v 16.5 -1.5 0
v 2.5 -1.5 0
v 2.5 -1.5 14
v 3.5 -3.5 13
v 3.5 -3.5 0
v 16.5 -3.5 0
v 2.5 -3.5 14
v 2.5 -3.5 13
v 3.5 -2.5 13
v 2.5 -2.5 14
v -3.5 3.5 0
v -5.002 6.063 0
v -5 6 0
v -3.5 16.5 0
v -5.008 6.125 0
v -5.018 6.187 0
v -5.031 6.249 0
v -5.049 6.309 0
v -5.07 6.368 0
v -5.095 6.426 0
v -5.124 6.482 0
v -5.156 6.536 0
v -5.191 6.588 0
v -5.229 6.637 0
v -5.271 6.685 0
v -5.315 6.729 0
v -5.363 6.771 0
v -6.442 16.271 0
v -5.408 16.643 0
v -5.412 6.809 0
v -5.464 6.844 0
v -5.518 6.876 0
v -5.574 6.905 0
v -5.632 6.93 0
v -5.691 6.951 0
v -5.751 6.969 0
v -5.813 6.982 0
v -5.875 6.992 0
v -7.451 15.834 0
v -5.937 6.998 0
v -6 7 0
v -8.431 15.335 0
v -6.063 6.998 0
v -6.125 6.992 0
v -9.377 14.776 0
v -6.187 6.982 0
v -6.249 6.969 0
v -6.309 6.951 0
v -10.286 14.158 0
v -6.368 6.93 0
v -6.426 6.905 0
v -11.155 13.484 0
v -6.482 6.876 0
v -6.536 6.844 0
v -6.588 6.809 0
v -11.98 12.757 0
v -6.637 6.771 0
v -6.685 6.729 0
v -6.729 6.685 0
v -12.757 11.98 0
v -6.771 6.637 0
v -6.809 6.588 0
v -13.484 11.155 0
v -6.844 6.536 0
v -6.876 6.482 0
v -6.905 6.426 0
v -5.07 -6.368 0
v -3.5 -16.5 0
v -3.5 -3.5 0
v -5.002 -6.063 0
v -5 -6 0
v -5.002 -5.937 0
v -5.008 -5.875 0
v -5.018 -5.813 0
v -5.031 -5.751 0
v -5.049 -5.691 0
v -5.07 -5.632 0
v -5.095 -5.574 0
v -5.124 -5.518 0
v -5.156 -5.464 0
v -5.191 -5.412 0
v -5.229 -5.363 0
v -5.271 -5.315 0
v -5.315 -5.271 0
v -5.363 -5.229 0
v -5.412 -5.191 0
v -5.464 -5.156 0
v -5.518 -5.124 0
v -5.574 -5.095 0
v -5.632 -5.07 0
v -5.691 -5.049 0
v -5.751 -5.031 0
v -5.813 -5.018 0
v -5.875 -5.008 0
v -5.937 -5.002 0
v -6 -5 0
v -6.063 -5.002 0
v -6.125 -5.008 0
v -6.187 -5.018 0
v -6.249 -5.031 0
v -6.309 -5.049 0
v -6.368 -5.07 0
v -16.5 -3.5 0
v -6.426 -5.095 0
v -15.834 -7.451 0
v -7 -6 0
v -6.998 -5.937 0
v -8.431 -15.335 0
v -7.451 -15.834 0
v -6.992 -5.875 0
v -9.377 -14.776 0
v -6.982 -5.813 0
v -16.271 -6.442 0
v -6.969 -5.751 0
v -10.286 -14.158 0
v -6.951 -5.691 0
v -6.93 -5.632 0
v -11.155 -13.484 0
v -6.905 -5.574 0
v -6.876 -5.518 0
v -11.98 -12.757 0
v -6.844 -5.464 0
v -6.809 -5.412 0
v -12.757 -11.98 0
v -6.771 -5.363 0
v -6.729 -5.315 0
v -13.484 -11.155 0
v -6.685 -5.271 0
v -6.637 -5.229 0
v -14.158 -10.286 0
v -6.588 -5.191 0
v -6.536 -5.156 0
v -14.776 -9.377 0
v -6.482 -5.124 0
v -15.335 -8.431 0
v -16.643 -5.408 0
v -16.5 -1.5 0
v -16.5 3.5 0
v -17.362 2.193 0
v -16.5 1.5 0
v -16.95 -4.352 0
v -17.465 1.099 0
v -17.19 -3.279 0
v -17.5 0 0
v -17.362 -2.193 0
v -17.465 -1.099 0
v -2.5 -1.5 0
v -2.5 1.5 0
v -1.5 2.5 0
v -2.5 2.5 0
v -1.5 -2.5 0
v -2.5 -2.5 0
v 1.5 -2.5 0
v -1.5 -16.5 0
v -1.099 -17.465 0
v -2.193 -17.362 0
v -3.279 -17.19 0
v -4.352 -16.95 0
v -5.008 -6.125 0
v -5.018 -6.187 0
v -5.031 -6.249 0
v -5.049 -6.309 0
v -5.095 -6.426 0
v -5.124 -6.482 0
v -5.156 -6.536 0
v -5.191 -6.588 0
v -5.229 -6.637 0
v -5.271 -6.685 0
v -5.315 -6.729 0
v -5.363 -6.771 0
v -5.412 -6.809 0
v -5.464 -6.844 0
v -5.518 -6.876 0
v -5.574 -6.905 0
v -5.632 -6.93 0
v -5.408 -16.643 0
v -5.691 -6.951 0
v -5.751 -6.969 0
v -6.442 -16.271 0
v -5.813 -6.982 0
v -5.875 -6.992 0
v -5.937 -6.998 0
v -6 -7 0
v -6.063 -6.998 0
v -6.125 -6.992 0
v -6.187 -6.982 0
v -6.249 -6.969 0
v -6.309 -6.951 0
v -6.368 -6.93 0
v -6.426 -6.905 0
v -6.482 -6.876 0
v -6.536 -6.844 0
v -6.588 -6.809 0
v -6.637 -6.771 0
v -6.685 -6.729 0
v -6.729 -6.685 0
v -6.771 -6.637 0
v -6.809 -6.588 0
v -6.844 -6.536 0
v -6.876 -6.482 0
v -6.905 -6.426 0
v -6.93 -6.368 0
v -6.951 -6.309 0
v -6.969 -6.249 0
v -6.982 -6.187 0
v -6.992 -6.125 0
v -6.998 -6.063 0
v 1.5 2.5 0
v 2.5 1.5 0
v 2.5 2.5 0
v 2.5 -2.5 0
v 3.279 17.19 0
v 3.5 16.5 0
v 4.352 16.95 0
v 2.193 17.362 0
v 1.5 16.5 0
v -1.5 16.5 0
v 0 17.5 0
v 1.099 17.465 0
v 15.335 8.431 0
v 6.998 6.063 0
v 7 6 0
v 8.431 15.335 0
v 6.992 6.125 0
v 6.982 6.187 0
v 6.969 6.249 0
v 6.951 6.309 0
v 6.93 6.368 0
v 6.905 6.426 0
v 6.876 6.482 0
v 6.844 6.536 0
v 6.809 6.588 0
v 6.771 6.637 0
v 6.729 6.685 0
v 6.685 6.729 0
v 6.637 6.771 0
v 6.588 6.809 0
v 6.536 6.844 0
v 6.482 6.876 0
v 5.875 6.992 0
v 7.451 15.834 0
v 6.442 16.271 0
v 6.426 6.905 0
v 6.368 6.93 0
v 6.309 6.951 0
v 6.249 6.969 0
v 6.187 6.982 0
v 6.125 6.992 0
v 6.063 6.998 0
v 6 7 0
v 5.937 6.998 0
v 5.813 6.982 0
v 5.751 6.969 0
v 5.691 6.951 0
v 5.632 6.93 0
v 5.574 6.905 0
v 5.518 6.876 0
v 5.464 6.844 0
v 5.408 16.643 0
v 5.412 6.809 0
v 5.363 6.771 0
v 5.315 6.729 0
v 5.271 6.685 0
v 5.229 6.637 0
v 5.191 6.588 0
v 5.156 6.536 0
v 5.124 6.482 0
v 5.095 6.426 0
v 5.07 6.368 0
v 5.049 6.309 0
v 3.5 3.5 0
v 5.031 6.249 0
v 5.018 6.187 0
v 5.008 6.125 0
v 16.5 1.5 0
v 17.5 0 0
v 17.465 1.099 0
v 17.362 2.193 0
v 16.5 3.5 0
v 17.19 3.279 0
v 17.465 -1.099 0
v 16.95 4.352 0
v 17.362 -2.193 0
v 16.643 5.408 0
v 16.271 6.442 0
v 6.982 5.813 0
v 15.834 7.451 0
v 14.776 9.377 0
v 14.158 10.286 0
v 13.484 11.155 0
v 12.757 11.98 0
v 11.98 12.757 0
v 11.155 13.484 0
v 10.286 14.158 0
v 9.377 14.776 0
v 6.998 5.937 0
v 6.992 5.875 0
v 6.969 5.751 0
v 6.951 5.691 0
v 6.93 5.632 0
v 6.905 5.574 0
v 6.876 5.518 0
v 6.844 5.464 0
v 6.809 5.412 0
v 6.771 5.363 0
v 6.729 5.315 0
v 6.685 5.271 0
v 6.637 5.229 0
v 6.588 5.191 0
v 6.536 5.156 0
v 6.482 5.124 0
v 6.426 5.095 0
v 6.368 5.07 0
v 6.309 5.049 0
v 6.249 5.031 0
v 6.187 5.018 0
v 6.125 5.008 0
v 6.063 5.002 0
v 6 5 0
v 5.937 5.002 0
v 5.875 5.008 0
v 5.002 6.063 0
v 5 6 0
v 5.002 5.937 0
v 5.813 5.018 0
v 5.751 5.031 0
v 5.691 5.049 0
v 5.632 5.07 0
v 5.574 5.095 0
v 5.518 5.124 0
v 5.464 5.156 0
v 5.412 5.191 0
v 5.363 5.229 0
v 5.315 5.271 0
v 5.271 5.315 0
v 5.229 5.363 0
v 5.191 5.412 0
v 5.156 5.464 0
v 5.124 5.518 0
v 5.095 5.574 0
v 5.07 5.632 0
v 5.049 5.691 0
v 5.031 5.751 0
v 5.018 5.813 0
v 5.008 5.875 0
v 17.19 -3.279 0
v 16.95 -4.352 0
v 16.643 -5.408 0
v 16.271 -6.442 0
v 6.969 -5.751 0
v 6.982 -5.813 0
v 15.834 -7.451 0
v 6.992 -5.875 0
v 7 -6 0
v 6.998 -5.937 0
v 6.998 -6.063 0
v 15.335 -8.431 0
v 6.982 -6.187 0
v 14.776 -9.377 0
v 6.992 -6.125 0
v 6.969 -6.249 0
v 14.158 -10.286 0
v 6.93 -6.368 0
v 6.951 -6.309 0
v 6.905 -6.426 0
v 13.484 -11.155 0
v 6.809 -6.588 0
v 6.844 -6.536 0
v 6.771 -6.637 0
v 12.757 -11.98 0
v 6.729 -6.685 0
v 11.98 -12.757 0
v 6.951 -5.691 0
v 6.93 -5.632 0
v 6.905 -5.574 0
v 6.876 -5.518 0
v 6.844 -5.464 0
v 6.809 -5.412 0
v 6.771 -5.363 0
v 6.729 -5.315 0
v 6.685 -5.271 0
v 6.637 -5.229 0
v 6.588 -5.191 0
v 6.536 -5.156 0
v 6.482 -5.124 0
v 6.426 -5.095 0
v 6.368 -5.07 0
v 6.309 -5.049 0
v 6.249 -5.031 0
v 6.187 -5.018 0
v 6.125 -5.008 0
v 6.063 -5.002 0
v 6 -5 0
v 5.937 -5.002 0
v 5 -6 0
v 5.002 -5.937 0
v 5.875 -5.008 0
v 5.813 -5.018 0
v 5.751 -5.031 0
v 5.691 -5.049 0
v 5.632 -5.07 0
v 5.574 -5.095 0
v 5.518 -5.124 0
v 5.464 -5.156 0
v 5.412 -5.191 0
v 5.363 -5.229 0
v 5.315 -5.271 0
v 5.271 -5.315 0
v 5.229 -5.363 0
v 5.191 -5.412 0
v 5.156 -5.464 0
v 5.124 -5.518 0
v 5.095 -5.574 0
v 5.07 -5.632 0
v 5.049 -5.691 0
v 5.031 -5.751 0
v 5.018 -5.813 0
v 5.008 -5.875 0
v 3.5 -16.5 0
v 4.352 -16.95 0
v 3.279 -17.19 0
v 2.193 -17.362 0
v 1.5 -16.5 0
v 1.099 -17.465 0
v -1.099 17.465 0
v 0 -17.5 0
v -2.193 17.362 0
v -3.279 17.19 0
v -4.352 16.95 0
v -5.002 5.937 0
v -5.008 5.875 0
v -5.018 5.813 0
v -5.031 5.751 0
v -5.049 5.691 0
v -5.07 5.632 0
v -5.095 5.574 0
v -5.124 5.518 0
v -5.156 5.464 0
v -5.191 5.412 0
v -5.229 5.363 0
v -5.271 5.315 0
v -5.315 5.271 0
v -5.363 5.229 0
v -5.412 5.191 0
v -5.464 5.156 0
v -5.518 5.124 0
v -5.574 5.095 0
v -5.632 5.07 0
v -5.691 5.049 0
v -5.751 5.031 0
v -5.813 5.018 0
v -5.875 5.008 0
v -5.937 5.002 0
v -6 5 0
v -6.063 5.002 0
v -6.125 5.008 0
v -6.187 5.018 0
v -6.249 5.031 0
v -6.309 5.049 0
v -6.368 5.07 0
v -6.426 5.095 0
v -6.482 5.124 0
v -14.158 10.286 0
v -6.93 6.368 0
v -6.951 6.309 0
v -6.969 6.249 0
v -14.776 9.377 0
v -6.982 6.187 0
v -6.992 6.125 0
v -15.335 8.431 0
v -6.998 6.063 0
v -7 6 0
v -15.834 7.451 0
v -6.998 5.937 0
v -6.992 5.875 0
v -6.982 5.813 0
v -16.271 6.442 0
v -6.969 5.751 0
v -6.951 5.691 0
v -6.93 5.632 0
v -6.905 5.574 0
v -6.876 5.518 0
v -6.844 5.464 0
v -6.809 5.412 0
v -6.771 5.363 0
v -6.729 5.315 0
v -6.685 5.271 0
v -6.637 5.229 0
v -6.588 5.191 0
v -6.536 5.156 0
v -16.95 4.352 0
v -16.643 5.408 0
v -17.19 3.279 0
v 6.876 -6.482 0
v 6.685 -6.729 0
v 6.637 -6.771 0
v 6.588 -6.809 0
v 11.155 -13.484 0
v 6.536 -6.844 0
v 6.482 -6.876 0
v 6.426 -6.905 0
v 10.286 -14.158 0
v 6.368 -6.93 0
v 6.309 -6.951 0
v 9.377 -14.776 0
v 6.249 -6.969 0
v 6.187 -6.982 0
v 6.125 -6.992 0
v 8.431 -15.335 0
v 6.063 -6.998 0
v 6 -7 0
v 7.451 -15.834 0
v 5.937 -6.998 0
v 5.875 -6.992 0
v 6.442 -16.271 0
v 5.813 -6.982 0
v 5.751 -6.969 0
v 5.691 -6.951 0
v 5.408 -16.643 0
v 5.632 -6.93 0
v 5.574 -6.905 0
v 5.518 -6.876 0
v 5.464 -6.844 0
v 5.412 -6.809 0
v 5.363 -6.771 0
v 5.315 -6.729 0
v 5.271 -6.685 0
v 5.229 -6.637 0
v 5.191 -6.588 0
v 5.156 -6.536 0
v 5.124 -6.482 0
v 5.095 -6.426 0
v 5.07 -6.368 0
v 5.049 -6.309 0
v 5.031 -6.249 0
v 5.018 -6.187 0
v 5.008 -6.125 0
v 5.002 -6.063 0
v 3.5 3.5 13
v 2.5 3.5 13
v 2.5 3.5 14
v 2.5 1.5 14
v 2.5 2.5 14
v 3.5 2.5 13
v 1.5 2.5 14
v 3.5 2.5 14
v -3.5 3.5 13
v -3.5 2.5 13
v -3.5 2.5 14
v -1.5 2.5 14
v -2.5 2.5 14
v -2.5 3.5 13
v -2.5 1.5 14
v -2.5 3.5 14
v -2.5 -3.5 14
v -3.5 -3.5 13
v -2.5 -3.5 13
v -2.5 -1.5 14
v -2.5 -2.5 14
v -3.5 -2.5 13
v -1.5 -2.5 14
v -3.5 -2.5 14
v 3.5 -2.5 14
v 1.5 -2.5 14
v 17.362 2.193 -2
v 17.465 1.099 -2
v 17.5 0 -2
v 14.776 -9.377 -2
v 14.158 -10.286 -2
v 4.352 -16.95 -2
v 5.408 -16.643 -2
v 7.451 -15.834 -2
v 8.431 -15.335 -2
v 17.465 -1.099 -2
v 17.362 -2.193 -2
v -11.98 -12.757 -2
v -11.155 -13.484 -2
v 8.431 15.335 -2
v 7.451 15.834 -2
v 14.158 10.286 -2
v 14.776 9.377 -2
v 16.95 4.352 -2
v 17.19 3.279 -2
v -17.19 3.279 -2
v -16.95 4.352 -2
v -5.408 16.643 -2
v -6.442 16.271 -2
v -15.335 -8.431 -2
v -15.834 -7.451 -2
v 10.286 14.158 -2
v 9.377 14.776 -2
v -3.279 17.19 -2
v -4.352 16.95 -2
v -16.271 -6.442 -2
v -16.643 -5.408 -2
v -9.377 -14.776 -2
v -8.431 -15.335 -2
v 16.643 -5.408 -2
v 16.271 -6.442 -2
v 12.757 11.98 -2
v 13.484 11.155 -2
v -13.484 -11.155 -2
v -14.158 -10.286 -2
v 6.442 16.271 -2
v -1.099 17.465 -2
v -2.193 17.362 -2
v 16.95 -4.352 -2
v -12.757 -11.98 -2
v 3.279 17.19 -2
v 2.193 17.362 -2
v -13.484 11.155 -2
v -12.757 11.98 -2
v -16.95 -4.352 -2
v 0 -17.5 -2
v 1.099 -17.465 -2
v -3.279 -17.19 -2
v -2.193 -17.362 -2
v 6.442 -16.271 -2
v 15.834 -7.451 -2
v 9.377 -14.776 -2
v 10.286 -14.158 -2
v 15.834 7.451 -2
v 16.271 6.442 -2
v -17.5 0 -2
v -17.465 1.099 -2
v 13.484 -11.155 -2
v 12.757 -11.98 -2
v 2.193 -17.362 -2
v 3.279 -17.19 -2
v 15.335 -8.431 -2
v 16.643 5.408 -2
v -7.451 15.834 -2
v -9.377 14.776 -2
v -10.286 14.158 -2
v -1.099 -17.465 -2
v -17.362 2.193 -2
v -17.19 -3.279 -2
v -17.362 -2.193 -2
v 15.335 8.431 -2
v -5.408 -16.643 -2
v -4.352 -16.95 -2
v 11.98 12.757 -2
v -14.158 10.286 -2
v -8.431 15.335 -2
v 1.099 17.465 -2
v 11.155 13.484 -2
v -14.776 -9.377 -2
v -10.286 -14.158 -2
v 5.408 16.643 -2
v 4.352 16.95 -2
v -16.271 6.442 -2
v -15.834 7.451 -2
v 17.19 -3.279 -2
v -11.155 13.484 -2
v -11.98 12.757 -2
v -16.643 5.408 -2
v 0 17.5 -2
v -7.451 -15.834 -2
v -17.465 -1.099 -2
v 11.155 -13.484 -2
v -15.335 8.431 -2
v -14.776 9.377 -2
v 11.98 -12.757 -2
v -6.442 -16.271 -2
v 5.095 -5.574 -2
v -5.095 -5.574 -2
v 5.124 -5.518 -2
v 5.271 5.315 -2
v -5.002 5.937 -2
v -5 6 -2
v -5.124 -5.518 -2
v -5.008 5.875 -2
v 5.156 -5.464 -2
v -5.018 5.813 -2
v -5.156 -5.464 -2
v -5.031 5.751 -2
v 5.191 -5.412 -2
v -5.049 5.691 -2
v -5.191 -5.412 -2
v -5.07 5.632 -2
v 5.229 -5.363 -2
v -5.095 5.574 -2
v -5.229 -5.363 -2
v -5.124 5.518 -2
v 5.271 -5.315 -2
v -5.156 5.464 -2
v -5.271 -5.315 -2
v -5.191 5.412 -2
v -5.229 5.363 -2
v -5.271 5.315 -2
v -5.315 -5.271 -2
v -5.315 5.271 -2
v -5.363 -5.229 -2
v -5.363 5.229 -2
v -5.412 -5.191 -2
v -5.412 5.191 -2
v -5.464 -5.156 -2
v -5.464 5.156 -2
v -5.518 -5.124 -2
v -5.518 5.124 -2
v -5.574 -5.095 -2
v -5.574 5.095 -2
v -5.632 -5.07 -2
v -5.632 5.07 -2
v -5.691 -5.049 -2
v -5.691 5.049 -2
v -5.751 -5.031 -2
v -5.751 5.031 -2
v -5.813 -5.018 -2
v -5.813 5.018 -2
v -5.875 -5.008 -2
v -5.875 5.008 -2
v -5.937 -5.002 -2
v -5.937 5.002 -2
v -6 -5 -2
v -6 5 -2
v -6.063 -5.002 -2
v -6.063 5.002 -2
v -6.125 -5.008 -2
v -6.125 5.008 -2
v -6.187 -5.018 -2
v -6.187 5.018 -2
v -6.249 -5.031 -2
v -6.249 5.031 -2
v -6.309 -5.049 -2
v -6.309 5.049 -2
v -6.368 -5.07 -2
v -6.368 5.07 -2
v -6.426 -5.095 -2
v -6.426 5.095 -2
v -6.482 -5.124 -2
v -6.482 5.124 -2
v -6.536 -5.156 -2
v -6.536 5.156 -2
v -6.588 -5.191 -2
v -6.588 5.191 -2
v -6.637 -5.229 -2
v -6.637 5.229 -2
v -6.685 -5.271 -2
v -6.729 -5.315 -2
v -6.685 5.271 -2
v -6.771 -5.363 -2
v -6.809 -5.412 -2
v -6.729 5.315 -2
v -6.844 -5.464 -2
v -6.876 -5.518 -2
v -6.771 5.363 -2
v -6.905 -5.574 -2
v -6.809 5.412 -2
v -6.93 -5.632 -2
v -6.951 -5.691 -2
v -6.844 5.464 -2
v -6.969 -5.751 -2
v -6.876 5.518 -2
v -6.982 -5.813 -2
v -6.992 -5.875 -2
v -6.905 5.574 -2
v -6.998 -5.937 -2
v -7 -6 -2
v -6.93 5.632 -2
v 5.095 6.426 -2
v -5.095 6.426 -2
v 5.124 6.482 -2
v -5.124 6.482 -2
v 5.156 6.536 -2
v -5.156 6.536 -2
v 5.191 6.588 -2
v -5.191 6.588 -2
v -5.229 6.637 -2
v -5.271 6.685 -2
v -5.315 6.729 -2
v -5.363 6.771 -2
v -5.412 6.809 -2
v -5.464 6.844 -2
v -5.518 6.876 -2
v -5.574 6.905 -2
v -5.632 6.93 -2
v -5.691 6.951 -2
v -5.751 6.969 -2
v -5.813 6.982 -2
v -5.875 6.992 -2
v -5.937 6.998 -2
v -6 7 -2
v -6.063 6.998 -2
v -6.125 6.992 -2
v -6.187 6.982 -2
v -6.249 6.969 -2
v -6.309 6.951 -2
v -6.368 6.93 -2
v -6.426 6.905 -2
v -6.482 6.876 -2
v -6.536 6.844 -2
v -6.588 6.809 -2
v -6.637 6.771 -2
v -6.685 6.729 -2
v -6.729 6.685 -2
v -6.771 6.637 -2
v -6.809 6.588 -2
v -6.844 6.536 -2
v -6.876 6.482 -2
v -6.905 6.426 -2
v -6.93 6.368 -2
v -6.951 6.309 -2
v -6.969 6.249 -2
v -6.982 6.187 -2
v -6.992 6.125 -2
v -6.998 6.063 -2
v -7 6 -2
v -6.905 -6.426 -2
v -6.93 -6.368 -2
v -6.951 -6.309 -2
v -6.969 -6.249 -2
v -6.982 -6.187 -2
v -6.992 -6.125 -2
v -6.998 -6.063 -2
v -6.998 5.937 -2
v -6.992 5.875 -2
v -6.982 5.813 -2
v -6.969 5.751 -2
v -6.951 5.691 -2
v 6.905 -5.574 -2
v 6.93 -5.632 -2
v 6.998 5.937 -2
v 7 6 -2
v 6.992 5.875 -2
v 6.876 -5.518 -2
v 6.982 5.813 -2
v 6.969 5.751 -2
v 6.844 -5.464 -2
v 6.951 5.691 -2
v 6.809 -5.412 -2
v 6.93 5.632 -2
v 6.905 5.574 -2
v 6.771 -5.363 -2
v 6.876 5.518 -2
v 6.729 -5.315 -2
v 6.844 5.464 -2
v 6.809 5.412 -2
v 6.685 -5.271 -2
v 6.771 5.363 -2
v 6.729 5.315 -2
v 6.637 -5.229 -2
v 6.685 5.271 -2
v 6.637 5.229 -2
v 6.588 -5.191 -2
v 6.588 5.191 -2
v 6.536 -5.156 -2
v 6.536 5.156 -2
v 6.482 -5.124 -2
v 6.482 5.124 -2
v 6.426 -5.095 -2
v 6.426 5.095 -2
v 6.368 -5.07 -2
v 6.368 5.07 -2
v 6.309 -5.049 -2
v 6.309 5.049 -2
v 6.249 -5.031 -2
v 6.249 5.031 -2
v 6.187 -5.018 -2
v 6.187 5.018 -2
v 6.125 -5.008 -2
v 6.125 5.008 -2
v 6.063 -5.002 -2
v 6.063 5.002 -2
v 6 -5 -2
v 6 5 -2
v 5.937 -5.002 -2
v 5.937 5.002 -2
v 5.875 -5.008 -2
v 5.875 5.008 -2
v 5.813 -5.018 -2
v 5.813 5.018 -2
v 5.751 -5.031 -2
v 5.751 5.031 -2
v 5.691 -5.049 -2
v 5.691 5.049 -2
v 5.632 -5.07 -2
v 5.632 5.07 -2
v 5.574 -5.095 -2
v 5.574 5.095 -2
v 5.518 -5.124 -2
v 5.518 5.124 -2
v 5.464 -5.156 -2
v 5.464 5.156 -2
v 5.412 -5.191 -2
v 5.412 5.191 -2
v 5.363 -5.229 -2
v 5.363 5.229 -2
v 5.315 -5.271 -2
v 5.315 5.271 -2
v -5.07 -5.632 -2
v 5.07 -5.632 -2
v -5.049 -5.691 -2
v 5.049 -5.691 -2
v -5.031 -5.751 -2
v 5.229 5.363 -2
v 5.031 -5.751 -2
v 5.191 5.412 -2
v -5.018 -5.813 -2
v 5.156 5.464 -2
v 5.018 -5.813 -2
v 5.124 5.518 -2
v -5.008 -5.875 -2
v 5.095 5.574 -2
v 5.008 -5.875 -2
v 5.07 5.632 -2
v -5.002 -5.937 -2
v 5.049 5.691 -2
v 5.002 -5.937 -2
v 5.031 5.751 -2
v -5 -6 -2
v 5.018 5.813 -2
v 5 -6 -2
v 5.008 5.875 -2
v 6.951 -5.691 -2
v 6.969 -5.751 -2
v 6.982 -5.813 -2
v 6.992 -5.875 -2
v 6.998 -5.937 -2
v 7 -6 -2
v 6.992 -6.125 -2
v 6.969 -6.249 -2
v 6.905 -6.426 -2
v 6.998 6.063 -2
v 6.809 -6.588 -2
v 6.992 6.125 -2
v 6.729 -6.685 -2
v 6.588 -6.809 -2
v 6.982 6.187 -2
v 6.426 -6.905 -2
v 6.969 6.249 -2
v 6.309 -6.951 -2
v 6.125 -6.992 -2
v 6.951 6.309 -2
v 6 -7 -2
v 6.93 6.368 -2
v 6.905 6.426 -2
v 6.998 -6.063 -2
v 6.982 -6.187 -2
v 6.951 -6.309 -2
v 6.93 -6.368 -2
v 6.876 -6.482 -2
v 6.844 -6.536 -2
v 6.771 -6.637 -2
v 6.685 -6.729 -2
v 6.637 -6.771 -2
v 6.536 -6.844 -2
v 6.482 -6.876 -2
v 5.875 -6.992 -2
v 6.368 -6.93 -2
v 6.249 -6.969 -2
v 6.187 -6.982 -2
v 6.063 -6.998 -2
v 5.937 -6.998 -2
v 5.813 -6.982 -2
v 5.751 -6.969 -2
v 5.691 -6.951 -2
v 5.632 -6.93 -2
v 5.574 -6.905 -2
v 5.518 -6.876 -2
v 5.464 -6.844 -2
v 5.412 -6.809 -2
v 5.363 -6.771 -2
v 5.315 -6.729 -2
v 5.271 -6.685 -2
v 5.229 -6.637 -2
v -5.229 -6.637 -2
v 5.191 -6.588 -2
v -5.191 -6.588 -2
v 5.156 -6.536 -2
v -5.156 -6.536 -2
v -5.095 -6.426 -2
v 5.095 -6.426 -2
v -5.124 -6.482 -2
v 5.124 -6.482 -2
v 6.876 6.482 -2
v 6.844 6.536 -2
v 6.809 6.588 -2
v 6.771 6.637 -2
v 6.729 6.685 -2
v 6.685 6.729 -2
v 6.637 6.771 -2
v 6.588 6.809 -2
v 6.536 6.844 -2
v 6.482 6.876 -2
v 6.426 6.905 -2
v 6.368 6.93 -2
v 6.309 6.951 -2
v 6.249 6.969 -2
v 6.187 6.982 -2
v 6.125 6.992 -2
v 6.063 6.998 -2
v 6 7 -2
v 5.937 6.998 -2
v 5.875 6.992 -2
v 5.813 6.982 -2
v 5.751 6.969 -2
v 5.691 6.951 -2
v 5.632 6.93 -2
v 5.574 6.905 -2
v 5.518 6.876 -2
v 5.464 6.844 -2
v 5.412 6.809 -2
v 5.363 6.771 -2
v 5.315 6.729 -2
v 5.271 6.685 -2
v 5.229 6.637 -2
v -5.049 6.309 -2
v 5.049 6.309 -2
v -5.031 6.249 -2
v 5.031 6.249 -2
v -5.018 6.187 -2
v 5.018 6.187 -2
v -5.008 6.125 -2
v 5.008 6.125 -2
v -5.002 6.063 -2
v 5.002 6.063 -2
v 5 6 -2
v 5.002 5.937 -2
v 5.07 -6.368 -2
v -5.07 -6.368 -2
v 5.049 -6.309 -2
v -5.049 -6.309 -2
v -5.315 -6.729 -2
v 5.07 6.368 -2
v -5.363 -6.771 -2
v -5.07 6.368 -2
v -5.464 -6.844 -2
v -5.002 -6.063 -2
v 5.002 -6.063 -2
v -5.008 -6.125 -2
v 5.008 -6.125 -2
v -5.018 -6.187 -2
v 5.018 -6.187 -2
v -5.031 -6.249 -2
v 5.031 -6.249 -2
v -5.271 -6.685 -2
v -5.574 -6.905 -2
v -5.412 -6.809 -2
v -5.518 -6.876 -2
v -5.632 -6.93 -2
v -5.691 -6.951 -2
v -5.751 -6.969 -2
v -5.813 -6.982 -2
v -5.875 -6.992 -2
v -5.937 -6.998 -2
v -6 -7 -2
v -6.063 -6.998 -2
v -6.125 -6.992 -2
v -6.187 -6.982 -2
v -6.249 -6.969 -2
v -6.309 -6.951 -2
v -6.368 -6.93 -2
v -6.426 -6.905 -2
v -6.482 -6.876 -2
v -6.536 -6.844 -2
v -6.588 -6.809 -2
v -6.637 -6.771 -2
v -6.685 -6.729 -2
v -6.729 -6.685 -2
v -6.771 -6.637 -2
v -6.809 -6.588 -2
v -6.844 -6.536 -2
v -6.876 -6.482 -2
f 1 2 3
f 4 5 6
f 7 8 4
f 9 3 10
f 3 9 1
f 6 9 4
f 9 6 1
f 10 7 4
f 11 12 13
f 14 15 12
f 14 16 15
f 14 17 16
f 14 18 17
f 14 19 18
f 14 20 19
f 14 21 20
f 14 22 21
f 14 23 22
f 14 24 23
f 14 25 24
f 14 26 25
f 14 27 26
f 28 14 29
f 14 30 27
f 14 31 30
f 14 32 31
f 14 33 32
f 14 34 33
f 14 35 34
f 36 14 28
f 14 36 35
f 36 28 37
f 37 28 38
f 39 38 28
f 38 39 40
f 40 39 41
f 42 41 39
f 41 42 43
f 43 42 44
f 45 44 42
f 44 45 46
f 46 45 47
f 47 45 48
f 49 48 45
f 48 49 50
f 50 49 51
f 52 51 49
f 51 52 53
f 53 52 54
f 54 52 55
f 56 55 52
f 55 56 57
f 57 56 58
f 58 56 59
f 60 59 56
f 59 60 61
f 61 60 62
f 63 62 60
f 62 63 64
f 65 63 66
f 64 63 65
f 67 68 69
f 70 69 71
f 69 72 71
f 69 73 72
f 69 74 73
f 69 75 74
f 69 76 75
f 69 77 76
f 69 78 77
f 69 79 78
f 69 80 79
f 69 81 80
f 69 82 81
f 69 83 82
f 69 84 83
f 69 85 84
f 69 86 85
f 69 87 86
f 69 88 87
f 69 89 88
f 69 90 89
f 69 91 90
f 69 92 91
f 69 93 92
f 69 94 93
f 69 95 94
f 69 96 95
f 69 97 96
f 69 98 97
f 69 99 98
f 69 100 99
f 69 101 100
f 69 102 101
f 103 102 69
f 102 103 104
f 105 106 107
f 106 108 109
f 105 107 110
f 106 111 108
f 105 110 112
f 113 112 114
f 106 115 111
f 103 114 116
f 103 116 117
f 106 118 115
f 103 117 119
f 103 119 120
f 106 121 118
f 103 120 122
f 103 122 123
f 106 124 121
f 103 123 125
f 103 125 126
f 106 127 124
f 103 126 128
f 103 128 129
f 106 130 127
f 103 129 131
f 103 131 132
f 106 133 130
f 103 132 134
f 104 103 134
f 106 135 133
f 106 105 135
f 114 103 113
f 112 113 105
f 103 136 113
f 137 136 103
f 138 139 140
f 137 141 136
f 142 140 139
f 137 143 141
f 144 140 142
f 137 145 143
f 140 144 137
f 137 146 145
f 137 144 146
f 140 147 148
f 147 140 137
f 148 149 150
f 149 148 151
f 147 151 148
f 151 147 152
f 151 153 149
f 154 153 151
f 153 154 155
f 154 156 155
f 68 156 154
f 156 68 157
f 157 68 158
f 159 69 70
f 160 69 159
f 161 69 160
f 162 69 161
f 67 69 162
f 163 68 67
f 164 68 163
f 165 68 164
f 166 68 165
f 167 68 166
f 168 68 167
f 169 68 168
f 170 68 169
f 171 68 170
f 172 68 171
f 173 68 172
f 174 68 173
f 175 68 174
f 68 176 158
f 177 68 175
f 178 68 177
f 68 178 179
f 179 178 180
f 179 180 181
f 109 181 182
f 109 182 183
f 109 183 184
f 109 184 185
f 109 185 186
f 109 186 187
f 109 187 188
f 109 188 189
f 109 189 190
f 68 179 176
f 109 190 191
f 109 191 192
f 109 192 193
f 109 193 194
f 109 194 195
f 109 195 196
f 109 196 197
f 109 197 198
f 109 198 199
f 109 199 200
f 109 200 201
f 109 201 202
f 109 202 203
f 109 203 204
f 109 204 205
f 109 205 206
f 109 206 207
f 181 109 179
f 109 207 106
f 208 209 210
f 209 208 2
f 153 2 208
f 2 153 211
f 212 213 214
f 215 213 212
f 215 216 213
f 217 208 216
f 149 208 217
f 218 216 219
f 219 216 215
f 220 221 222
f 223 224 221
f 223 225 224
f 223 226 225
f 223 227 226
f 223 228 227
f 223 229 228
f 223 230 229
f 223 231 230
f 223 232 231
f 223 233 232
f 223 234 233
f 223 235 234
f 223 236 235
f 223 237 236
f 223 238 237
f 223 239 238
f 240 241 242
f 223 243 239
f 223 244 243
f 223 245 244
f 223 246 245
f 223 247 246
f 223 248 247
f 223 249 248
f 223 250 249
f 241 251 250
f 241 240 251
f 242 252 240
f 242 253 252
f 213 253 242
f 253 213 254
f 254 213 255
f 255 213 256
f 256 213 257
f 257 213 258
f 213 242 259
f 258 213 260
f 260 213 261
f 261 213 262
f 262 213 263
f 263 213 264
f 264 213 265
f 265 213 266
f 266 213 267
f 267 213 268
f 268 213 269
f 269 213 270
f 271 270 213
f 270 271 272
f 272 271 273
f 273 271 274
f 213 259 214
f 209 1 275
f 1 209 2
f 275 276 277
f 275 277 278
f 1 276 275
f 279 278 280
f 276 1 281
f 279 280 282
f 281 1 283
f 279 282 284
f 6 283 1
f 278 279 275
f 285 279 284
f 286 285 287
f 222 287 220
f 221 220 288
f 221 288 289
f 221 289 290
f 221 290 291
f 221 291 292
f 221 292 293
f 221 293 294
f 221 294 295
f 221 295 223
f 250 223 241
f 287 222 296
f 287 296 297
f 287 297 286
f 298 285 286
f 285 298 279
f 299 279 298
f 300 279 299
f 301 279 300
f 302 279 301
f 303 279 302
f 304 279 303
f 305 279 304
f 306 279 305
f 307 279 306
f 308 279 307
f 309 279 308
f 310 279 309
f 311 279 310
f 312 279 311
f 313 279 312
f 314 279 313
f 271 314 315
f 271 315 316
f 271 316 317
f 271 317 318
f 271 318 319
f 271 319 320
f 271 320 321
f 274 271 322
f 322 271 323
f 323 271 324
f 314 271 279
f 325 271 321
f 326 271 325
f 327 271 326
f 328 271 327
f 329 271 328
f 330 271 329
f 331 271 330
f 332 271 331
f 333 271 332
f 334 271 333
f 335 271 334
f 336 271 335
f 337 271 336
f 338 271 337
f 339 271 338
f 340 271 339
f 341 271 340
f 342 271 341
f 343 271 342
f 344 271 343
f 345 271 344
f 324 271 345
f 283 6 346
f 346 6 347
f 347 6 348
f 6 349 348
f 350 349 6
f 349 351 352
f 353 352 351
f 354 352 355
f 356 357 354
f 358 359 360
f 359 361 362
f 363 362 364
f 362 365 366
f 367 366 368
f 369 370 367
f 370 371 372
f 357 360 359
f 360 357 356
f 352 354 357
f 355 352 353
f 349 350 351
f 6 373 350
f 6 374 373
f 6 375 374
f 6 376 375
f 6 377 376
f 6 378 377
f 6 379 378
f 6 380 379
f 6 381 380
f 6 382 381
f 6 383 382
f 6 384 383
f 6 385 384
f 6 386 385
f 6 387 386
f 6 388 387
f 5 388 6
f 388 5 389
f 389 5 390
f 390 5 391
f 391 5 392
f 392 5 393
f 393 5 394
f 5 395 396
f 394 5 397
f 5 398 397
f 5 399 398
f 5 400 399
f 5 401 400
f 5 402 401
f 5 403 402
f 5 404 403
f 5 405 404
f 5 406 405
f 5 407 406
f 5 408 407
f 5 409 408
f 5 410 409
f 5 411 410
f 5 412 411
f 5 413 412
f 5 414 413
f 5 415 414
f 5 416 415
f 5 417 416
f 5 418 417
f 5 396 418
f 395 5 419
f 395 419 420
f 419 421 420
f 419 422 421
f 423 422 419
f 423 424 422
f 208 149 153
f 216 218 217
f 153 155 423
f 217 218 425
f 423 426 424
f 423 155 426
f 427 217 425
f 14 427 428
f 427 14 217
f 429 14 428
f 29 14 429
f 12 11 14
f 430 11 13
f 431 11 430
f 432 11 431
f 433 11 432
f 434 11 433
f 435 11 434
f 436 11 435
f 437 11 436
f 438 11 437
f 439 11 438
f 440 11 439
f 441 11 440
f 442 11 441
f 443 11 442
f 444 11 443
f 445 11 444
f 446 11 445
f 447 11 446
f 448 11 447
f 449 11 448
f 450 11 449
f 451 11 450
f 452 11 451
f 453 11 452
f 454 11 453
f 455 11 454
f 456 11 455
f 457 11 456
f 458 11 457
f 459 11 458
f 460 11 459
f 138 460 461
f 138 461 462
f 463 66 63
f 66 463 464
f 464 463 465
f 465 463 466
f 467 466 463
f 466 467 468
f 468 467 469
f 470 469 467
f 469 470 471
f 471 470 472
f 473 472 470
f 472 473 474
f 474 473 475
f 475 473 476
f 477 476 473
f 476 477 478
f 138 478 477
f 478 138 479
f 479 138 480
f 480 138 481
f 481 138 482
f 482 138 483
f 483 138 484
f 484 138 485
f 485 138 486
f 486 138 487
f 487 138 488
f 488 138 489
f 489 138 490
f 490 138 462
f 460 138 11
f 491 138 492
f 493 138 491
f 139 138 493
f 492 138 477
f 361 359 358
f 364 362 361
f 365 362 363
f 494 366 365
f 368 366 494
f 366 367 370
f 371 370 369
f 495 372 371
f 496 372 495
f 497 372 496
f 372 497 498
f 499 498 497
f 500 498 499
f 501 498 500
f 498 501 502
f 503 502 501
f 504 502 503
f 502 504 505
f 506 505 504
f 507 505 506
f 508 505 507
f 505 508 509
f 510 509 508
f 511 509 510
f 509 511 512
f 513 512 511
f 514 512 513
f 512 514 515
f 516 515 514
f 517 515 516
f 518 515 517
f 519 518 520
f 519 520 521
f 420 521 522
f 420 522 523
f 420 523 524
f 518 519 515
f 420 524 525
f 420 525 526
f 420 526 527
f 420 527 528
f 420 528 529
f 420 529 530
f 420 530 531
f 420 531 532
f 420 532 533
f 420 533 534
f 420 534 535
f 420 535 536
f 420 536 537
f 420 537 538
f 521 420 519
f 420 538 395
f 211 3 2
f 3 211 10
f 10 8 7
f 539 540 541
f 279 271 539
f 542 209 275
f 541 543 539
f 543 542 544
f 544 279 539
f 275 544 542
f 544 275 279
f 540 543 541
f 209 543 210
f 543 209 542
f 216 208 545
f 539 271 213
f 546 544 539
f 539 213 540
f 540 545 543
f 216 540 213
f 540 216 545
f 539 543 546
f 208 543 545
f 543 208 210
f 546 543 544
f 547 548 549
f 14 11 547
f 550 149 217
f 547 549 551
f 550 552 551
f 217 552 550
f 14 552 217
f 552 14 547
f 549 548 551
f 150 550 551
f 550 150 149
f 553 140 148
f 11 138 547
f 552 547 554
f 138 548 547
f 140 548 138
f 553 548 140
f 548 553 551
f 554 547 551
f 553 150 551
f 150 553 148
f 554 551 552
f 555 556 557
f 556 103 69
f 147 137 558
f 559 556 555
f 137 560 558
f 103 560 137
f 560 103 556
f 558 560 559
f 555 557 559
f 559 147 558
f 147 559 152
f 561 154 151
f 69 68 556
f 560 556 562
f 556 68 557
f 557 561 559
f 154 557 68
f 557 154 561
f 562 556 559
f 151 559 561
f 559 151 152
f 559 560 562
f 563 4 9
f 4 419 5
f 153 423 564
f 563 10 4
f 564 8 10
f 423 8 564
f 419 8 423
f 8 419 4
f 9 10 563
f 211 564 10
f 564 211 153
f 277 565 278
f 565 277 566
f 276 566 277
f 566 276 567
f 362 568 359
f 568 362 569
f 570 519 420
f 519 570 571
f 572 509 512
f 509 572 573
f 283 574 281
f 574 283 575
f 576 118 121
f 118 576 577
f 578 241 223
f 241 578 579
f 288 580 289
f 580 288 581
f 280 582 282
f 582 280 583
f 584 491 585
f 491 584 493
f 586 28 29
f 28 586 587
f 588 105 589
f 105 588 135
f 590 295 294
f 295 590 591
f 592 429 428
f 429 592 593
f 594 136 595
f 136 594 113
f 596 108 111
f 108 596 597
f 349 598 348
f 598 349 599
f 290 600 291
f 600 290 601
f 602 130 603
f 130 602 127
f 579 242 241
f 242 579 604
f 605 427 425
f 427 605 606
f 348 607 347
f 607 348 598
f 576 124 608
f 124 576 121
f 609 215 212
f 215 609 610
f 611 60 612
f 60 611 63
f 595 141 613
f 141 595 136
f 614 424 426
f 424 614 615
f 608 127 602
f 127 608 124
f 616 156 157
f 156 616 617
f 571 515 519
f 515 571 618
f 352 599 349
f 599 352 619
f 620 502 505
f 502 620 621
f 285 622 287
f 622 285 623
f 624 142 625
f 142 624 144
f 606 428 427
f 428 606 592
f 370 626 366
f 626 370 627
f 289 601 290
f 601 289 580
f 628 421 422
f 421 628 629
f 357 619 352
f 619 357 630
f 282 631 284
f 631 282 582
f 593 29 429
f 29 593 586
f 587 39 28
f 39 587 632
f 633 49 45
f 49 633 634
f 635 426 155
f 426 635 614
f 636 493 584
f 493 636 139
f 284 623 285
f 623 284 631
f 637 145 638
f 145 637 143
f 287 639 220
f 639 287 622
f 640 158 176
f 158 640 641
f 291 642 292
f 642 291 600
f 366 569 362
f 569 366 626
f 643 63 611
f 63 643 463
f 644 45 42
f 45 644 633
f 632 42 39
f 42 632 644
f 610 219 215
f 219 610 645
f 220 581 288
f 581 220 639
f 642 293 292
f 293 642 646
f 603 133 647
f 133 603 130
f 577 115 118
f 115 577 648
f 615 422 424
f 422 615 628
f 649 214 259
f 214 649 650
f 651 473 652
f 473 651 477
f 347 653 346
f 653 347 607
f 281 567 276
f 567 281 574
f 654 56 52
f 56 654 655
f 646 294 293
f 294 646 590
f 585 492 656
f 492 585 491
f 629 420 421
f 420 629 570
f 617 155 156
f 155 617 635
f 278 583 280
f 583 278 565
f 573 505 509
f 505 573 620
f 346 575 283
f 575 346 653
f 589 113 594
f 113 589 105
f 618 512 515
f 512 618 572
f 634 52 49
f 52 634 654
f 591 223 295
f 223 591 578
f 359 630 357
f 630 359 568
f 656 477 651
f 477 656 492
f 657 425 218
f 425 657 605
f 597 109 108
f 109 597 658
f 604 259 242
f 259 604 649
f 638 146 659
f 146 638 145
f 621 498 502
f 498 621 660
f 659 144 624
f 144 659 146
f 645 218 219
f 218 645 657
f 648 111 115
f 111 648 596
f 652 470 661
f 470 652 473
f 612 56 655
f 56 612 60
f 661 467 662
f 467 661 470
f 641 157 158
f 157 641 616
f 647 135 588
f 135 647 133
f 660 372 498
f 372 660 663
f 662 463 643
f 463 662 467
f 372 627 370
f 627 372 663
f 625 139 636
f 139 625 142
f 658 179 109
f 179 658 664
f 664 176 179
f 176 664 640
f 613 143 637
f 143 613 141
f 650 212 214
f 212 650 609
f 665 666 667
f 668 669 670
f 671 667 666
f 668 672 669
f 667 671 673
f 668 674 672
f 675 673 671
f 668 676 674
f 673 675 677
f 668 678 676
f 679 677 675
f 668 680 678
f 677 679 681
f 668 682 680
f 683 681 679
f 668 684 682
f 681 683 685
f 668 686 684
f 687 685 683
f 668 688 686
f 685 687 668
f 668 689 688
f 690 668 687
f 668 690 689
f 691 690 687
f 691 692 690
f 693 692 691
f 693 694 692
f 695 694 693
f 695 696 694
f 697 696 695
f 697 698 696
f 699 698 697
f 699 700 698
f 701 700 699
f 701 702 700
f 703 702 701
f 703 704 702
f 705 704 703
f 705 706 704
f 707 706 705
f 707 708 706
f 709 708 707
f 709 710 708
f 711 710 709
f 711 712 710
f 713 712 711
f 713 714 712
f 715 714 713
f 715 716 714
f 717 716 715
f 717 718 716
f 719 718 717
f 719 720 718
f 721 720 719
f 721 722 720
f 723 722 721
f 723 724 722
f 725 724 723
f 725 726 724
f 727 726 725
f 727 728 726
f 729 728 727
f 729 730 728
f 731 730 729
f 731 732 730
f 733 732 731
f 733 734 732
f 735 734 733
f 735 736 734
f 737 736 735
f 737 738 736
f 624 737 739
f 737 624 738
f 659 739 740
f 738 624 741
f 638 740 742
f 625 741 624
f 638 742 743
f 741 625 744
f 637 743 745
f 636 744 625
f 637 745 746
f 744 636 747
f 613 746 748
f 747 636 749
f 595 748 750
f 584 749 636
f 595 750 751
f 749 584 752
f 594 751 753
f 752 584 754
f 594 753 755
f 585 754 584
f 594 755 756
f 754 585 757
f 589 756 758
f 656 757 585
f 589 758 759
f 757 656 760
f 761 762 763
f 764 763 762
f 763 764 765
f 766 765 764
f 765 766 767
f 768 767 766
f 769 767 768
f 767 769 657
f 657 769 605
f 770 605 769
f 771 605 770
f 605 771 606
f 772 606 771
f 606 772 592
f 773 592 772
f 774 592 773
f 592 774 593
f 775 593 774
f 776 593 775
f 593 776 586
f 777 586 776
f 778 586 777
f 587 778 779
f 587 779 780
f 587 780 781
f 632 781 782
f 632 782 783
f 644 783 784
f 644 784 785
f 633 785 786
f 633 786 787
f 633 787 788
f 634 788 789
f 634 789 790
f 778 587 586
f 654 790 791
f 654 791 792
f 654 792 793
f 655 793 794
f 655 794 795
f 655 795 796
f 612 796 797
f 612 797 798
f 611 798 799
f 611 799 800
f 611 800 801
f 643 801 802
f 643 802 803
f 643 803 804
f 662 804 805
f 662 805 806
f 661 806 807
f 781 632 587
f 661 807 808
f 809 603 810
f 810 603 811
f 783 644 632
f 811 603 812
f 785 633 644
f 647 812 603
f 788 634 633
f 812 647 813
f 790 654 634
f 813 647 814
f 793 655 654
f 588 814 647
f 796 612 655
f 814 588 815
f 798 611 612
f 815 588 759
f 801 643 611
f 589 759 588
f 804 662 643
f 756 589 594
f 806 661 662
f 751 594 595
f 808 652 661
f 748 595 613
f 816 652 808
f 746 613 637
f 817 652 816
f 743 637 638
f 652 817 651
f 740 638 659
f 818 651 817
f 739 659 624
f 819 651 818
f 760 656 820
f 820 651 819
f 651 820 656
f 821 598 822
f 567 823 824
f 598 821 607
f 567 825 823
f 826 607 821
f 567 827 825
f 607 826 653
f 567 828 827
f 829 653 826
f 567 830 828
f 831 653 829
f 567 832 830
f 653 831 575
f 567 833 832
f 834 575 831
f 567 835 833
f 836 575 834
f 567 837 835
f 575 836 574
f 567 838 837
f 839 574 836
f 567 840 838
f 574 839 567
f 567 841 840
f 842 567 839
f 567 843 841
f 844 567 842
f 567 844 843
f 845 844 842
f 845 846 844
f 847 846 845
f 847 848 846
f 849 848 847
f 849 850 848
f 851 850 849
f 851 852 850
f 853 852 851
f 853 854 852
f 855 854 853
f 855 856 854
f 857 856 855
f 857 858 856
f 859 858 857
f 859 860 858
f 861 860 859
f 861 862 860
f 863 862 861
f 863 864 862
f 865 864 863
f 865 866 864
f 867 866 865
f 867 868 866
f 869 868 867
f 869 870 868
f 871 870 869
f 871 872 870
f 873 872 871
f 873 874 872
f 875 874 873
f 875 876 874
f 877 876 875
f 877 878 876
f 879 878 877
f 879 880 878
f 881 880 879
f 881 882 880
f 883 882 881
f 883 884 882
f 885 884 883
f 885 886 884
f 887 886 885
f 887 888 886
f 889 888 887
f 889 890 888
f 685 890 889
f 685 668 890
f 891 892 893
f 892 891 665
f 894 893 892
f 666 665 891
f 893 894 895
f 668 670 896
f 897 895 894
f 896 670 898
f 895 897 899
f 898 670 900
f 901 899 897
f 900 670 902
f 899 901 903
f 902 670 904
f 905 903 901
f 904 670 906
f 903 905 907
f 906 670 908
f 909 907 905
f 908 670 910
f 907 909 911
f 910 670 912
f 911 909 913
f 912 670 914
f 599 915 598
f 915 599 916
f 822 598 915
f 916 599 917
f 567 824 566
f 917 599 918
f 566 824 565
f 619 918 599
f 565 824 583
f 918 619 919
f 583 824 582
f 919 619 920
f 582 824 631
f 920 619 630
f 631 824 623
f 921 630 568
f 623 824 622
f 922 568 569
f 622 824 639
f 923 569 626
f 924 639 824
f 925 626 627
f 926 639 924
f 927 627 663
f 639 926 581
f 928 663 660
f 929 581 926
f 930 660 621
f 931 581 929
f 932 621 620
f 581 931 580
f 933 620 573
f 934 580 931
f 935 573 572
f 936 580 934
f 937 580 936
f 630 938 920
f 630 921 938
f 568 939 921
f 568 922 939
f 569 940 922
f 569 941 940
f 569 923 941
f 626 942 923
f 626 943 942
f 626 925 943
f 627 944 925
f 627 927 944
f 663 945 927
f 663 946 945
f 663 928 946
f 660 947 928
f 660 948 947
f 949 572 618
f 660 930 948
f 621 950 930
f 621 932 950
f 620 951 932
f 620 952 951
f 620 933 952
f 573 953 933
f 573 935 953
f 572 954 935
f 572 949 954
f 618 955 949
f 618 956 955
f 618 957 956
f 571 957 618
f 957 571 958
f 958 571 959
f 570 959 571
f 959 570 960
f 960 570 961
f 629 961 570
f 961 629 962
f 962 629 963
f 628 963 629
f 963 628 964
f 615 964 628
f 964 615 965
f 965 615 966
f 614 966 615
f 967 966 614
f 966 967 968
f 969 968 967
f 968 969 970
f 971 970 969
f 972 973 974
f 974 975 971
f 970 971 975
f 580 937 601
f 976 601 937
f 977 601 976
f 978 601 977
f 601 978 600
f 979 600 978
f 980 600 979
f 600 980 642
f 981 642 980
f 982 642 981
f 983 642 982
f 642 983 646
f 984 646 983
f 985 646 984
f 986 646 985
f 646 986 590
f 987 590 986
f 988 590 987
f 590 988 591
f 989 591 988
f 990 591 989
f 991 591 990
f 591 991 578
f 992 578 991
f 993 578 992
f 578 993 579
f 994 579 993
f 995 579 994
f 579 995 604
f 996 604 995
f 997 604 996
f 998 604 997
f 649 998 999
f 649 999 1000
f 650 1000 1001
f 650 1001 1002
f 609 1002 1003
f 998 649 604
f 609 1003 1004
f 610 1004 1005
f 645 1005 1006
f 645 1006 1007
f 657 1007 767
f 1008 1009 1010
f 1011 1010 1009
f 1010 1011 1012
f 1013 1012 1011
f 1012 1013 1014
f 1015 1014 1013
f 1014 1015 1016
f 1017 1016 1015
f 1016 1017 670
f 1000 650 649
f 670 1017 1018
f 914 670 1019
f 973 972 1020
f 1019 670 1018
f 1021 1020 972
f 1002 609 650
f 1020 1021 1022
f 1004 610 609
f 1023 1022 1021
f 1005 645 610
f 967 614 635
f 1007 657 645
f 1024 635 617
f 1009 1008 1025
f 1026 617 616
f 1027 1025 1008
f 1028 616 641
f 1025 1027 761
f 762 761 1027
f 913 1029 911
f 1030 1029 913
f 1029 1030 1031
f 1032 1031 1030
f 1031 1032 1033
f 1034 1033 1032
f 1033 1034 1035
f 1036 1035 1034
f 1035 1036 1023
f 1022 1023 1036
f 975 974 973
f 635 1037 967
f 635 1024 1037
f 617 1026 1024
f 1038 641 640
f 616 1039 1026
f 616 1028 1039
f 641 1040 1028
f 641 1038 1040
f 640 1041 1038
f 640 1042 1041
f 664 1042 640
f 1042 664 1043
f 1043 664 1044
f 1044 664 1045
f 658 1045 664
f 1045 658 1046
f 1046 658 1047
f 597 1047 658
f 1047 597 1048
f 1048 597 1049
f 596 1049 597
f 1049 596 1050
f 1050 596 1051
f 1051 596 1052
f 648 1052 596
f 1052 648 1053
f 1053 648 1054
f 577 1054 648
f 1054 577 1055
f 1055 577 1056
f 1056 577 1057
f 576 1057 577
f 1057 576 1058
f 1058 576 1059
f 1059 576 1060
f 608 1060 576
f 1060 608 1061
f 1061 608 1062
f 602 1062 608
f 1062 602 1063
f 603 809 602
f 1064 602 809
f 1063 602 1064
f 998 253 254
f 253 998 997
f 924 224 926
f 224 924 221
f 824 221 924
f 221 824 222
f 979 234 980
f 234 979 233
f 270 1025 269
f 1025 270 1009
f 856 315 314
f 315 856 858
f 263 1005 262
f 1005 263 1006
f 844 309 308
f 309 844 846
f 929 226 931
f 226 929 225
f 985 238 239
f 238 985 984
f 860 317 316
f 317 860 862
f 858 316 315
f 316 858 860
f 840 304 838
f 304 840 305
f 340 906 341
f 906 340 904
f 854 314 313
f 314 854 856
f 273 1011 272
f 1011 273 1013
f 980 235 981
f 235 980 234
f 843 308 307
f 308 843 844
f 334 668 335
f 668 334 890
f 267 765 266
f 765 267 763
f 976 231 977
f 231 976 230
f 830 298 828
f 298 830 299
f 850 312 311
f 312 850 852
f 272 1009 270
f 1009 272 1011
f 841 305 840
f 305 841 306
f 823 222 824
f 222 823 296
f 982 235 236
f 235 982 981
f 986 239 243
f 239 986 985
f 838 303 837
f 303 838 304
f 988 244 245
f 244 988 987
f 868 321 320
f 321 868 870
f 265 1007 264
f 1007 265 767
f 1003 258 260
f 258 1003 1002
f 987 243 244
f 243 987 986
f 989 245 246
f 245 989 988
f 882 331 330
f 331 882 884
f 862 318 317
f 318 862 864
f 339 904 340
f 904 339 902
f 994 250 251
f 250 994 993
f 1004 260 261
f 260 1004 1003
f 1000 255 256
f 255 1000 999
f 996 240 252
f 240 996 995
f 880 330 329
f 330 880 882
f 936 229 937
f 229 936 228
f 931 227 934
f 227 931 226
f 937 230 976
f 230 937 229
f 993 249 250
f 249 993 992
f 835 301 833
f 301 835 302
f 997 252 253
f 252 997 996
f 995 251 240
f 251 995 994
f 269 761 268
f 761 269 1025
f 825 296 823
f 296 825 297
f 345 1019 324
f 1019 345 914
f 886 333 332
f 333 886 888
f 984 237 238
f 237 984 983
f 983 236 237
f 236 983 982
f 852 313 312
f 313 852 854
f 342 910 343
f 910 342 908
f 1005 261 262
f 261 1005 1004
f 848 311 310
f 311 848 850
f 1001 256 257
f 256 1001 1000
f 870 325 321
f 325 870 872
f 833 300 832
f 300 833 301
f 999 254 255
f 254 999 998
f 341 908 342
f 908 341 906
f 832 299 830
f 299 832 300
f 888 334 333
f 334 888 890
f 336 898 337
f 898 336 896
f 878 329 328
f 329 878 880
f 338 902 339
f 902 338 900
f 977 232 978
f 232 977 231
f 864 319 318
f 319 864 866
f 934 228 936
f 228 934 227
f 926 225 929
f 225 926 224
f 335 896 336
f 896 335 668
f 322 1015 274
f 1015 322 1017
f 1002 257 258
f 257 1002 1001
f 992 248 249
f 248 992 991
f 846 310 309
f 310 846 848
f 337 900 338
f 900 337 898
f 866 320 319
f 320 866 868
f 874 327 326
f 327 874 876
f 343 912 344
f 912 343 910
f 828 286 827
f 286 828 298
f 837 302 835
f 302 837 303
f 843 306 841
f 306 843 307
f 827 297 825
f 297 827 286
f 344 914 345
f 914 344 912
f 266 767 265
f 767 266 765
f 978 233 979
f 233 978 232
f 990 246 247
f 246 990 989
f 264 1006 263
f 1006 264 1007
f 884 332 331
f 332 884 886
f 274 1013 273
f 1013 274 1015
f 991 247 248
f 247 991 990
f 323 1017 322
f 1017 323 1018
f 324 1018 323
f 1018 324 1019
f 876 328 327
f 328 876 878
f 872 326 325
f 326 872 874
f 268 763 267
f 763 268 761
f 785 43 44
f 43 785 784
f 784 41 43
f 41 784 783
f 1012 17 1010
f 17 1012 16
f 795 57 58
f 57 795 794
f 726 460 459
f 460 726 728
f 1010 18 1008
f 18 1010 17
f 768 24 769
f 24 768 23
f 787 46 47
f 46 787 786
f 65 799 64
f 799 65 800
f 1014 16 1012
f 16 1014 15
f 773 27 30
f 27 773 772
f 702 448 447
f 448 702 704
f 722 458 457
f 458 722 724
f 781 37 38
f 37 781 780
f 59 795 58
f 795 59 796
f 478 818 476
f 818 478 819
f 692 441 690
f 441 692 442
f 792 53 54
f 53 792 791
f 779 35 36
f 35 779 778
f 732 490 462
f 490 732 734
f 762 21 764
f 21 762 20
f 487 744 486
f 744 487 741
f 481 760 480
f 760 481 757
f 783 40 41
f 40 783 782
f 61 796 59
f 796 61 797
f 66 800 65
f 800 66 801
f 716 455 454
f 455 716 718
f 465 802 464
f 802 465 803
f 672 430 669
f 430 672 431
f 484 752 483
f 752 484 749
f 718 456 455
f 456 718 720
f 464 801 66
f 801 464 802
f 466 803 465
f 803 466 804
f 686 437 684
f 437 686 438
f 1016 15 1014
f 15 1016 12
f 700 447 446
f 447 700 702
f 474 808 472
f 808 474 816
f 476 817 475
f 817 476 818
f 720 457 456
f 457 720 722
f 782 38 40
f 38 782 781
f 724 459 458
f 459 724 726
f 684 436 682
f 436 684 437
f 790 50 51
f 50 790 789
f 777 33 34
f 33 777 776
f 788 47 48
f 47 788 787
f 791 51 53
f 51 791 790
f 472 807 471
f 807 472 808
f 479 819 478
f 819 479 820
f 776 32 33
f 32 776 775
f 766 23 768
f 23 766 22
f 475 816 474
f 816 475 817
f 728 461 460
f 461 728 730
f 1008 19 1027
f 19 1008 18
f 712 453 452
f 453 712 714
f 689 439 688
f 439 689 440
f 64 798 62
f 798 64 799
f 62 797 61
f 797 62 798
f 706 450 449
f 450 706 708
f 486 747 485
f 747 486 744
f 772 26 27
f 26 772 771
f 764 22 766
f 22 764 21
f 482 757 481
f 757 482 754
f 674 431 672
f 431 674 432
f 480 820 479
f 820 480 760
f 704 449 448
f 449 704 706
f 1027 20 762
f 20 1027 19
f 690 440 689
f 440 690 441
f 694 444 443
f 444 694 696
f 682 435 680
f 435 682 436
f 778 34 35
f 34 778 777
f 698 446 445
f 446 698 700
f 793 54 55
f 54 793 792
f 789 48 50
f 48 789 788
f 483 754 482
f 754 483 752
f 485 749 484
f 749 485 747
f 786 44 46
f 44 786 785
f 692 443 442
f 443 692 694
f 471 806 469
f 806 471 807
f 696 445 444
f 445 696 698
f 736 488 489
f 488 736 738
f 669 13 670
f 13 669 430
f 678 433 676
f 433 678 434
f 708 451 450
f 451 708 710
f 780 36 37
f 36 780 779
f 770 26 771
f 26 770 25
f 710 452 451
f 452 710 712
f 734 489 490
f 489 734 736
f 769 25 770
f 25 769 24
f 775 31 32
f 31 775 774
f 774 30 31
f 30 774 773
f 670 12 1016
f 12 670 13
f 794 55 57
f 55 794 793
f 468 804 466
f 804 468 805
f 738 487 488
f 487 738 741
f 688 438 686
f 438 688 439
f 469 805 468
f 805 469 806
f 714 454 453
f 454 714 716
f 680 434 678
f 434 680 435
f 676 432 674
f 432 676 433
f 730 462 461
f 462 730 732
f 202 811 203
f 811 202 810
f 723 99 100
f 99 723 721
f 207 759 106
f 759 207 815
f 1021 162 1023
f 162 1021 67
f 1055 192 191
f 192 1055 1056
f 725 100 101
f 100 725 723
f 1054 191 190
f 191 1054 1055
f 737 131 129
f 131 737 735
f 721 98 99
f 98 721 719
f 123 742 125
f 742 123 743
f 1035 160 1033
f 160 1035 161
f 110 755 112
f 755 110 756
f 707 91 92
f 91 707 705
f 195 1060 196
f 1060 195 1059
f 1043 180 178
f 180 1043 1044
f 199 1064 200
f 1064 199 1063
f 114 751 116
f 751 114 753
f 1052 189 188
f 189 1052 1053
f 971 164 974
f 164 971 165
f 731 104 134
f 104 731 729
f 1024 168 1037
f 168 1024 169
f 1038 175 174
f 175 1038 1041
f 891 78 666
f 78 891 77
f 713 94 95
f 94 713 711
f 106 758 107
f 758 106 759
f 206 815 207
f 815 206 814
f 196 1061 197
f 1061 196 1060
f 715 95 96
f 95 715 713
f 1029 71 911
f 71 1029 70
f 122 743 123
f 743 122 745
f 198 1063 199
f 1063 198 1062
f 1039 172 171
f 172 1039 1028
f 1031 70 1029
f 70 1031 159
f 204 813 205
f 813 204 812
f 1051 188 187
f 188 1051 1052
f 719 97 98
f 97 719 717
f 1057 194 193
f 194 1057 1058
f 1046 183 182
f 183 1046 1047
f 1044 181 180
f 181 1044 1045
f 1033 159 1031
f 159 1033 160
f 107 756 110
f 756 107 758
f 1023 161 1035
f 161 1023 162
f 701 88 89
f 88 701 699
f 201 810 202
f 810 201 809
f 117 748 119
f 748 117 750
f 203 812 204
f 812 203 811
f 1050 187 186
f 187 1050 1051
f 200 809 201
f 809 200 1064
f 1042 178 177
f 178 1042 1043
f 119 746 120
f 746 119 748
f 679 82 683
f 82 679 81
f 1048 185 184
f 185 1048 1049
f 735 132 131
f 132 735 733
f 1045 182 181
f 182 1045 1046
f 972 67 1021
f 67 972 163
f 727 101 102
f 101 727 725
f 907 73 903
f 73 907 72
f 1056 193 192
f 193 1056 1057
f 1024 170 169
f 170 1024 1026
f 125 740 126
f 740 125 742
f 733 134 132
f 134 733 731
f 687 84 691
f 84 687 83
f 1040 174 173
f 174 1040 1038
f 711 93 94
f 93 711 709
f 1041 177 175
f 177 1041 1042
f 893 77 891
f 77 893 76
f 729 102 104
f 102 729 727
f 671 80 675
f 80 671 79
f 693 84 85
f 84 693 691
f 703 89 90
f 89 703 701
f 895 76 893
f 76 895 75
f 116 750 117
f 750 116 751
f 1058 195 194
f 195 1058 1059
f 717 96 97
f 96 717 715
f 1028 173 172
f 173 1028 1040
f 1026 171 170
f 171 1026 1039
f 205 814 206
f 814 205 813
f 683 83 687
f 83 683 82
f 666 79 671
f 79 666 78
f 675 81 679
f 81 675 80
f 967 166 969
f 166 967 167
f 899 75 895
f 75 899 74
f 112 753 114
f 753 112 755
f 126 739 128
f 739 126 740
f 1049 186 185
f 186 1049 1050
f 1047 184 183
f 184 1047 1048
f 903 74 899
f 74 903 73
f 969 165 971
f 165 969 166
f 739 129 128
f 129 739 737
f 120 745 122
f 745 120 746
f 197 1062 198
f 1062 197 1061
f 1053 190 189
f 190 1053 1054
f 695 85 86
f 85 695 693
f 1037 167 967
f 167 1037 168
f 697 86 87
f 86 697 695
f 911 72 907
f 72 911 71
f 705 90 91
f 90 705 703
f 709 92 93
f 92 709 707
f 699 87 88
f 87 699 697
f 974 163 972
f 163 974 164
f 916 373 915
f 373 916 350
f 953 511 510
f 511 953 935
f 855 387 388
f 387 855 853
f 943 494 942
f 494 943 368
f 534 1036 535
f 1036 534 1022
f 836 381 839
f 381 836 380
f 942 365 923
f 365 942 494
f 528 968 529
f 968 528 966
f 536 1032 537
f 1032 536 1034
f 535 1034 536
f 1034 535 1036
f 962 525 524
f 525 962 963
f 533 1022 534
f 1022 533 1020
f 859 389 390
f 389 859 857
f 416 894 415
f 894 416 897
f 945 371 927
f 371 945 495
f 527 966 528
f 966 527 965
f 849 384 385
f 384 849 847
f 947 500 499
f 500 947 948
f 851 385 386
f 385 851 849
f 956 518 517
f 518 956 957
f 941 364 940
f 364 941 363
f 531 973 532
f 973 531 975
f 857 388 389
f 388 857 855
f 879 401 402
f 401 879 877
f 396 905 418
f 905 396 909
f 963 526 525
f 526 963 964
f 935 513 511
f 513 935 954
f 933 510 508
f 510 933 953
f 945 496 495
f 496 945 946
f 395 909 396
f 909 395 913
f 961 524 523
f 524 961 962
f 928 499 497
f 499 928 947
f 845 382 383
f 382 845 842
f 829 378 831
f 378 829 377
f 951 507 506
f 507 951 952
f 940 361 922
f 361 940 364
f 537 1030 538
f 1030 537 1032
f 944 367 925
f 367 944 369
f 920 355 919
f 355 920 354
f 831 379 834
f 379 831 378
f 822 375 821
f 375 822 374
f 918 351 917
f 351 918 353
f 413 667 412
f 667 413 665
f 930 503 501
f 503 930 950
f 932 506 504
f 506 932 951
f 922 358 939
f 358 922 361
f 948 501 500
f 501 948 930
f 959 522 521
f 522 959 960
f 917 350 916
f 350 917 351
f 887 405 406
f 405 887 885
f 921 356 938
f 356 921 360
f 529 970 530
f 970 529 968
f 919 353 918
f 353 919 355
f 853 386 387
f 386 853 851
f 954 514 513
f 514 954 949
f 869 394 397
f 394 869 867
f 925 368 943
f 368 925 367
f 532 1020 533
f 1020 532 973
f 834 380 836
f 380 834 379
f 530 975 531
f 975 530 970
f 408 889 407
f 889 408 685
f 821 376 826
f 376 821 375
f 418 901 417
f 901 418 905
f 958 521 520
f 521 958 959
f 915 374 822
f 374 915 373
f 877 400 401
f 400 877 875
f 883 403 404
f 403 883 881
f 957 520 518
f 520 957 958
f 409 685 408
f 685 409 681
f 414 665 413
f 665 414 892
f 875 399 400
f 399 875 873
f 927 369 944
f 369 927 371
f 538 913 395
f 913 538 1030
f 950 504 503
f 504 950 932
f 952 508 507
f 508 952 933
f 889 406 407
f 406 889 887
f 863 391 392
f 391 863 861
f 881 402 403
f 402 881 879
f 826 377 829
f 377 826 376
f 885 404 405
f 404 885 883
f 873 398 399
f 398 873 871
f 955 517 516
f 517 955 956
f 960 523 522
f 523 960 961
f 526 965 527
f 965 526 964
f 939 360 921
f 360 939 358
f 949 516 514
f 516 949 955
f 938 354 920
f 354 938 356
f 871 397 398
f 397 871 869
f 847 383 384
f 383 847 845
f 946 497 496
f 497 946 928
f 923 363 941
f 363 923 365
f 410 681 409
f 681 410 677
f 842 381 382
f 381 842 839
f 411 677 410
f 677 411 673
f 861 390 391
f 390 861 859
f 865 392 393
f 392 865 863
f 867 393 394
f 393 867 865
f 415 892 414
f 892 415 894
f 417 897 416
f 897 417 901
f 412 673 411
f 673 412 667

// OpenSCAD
$fs = 0.01;
$fn = 100;

thick = 2;
diam = 35;
board_thick = 5;
hole_diam = 2;
//TODO: check if this is correct: distance between mounting screws
offset = 12;

module pole()
{
    for (sign = [-1,1])
    {
        translate([0,sign*board_thick/2,0])
        translate([board_thick/2,0,0])
        translate([0,thick/2,0])
        rotate(90,[1,0,0])
        linear_extrude(thick)
        {
            a = diam/2.5;
            polygon([[0,0], [a,0], [0,a]]);
        }
    }
}

difference()
{
    union()
    {
        translate([0,0,-thick/2])
        cylinder(thick, diam/2,diam/2,true);
        for (angle = [0,90,180,270])
        {
            rotate(angle, [0,0,1])
            pole();
        }
    }

    for (angle = [0,90,180,270])
    {
        rotate(angle, [0,0,1])
        translate([offset/2,offset/2,-thick/2])
        cylinder(thick+$fs, hole_diam/2,hole_diam/2, true);
    }
}
